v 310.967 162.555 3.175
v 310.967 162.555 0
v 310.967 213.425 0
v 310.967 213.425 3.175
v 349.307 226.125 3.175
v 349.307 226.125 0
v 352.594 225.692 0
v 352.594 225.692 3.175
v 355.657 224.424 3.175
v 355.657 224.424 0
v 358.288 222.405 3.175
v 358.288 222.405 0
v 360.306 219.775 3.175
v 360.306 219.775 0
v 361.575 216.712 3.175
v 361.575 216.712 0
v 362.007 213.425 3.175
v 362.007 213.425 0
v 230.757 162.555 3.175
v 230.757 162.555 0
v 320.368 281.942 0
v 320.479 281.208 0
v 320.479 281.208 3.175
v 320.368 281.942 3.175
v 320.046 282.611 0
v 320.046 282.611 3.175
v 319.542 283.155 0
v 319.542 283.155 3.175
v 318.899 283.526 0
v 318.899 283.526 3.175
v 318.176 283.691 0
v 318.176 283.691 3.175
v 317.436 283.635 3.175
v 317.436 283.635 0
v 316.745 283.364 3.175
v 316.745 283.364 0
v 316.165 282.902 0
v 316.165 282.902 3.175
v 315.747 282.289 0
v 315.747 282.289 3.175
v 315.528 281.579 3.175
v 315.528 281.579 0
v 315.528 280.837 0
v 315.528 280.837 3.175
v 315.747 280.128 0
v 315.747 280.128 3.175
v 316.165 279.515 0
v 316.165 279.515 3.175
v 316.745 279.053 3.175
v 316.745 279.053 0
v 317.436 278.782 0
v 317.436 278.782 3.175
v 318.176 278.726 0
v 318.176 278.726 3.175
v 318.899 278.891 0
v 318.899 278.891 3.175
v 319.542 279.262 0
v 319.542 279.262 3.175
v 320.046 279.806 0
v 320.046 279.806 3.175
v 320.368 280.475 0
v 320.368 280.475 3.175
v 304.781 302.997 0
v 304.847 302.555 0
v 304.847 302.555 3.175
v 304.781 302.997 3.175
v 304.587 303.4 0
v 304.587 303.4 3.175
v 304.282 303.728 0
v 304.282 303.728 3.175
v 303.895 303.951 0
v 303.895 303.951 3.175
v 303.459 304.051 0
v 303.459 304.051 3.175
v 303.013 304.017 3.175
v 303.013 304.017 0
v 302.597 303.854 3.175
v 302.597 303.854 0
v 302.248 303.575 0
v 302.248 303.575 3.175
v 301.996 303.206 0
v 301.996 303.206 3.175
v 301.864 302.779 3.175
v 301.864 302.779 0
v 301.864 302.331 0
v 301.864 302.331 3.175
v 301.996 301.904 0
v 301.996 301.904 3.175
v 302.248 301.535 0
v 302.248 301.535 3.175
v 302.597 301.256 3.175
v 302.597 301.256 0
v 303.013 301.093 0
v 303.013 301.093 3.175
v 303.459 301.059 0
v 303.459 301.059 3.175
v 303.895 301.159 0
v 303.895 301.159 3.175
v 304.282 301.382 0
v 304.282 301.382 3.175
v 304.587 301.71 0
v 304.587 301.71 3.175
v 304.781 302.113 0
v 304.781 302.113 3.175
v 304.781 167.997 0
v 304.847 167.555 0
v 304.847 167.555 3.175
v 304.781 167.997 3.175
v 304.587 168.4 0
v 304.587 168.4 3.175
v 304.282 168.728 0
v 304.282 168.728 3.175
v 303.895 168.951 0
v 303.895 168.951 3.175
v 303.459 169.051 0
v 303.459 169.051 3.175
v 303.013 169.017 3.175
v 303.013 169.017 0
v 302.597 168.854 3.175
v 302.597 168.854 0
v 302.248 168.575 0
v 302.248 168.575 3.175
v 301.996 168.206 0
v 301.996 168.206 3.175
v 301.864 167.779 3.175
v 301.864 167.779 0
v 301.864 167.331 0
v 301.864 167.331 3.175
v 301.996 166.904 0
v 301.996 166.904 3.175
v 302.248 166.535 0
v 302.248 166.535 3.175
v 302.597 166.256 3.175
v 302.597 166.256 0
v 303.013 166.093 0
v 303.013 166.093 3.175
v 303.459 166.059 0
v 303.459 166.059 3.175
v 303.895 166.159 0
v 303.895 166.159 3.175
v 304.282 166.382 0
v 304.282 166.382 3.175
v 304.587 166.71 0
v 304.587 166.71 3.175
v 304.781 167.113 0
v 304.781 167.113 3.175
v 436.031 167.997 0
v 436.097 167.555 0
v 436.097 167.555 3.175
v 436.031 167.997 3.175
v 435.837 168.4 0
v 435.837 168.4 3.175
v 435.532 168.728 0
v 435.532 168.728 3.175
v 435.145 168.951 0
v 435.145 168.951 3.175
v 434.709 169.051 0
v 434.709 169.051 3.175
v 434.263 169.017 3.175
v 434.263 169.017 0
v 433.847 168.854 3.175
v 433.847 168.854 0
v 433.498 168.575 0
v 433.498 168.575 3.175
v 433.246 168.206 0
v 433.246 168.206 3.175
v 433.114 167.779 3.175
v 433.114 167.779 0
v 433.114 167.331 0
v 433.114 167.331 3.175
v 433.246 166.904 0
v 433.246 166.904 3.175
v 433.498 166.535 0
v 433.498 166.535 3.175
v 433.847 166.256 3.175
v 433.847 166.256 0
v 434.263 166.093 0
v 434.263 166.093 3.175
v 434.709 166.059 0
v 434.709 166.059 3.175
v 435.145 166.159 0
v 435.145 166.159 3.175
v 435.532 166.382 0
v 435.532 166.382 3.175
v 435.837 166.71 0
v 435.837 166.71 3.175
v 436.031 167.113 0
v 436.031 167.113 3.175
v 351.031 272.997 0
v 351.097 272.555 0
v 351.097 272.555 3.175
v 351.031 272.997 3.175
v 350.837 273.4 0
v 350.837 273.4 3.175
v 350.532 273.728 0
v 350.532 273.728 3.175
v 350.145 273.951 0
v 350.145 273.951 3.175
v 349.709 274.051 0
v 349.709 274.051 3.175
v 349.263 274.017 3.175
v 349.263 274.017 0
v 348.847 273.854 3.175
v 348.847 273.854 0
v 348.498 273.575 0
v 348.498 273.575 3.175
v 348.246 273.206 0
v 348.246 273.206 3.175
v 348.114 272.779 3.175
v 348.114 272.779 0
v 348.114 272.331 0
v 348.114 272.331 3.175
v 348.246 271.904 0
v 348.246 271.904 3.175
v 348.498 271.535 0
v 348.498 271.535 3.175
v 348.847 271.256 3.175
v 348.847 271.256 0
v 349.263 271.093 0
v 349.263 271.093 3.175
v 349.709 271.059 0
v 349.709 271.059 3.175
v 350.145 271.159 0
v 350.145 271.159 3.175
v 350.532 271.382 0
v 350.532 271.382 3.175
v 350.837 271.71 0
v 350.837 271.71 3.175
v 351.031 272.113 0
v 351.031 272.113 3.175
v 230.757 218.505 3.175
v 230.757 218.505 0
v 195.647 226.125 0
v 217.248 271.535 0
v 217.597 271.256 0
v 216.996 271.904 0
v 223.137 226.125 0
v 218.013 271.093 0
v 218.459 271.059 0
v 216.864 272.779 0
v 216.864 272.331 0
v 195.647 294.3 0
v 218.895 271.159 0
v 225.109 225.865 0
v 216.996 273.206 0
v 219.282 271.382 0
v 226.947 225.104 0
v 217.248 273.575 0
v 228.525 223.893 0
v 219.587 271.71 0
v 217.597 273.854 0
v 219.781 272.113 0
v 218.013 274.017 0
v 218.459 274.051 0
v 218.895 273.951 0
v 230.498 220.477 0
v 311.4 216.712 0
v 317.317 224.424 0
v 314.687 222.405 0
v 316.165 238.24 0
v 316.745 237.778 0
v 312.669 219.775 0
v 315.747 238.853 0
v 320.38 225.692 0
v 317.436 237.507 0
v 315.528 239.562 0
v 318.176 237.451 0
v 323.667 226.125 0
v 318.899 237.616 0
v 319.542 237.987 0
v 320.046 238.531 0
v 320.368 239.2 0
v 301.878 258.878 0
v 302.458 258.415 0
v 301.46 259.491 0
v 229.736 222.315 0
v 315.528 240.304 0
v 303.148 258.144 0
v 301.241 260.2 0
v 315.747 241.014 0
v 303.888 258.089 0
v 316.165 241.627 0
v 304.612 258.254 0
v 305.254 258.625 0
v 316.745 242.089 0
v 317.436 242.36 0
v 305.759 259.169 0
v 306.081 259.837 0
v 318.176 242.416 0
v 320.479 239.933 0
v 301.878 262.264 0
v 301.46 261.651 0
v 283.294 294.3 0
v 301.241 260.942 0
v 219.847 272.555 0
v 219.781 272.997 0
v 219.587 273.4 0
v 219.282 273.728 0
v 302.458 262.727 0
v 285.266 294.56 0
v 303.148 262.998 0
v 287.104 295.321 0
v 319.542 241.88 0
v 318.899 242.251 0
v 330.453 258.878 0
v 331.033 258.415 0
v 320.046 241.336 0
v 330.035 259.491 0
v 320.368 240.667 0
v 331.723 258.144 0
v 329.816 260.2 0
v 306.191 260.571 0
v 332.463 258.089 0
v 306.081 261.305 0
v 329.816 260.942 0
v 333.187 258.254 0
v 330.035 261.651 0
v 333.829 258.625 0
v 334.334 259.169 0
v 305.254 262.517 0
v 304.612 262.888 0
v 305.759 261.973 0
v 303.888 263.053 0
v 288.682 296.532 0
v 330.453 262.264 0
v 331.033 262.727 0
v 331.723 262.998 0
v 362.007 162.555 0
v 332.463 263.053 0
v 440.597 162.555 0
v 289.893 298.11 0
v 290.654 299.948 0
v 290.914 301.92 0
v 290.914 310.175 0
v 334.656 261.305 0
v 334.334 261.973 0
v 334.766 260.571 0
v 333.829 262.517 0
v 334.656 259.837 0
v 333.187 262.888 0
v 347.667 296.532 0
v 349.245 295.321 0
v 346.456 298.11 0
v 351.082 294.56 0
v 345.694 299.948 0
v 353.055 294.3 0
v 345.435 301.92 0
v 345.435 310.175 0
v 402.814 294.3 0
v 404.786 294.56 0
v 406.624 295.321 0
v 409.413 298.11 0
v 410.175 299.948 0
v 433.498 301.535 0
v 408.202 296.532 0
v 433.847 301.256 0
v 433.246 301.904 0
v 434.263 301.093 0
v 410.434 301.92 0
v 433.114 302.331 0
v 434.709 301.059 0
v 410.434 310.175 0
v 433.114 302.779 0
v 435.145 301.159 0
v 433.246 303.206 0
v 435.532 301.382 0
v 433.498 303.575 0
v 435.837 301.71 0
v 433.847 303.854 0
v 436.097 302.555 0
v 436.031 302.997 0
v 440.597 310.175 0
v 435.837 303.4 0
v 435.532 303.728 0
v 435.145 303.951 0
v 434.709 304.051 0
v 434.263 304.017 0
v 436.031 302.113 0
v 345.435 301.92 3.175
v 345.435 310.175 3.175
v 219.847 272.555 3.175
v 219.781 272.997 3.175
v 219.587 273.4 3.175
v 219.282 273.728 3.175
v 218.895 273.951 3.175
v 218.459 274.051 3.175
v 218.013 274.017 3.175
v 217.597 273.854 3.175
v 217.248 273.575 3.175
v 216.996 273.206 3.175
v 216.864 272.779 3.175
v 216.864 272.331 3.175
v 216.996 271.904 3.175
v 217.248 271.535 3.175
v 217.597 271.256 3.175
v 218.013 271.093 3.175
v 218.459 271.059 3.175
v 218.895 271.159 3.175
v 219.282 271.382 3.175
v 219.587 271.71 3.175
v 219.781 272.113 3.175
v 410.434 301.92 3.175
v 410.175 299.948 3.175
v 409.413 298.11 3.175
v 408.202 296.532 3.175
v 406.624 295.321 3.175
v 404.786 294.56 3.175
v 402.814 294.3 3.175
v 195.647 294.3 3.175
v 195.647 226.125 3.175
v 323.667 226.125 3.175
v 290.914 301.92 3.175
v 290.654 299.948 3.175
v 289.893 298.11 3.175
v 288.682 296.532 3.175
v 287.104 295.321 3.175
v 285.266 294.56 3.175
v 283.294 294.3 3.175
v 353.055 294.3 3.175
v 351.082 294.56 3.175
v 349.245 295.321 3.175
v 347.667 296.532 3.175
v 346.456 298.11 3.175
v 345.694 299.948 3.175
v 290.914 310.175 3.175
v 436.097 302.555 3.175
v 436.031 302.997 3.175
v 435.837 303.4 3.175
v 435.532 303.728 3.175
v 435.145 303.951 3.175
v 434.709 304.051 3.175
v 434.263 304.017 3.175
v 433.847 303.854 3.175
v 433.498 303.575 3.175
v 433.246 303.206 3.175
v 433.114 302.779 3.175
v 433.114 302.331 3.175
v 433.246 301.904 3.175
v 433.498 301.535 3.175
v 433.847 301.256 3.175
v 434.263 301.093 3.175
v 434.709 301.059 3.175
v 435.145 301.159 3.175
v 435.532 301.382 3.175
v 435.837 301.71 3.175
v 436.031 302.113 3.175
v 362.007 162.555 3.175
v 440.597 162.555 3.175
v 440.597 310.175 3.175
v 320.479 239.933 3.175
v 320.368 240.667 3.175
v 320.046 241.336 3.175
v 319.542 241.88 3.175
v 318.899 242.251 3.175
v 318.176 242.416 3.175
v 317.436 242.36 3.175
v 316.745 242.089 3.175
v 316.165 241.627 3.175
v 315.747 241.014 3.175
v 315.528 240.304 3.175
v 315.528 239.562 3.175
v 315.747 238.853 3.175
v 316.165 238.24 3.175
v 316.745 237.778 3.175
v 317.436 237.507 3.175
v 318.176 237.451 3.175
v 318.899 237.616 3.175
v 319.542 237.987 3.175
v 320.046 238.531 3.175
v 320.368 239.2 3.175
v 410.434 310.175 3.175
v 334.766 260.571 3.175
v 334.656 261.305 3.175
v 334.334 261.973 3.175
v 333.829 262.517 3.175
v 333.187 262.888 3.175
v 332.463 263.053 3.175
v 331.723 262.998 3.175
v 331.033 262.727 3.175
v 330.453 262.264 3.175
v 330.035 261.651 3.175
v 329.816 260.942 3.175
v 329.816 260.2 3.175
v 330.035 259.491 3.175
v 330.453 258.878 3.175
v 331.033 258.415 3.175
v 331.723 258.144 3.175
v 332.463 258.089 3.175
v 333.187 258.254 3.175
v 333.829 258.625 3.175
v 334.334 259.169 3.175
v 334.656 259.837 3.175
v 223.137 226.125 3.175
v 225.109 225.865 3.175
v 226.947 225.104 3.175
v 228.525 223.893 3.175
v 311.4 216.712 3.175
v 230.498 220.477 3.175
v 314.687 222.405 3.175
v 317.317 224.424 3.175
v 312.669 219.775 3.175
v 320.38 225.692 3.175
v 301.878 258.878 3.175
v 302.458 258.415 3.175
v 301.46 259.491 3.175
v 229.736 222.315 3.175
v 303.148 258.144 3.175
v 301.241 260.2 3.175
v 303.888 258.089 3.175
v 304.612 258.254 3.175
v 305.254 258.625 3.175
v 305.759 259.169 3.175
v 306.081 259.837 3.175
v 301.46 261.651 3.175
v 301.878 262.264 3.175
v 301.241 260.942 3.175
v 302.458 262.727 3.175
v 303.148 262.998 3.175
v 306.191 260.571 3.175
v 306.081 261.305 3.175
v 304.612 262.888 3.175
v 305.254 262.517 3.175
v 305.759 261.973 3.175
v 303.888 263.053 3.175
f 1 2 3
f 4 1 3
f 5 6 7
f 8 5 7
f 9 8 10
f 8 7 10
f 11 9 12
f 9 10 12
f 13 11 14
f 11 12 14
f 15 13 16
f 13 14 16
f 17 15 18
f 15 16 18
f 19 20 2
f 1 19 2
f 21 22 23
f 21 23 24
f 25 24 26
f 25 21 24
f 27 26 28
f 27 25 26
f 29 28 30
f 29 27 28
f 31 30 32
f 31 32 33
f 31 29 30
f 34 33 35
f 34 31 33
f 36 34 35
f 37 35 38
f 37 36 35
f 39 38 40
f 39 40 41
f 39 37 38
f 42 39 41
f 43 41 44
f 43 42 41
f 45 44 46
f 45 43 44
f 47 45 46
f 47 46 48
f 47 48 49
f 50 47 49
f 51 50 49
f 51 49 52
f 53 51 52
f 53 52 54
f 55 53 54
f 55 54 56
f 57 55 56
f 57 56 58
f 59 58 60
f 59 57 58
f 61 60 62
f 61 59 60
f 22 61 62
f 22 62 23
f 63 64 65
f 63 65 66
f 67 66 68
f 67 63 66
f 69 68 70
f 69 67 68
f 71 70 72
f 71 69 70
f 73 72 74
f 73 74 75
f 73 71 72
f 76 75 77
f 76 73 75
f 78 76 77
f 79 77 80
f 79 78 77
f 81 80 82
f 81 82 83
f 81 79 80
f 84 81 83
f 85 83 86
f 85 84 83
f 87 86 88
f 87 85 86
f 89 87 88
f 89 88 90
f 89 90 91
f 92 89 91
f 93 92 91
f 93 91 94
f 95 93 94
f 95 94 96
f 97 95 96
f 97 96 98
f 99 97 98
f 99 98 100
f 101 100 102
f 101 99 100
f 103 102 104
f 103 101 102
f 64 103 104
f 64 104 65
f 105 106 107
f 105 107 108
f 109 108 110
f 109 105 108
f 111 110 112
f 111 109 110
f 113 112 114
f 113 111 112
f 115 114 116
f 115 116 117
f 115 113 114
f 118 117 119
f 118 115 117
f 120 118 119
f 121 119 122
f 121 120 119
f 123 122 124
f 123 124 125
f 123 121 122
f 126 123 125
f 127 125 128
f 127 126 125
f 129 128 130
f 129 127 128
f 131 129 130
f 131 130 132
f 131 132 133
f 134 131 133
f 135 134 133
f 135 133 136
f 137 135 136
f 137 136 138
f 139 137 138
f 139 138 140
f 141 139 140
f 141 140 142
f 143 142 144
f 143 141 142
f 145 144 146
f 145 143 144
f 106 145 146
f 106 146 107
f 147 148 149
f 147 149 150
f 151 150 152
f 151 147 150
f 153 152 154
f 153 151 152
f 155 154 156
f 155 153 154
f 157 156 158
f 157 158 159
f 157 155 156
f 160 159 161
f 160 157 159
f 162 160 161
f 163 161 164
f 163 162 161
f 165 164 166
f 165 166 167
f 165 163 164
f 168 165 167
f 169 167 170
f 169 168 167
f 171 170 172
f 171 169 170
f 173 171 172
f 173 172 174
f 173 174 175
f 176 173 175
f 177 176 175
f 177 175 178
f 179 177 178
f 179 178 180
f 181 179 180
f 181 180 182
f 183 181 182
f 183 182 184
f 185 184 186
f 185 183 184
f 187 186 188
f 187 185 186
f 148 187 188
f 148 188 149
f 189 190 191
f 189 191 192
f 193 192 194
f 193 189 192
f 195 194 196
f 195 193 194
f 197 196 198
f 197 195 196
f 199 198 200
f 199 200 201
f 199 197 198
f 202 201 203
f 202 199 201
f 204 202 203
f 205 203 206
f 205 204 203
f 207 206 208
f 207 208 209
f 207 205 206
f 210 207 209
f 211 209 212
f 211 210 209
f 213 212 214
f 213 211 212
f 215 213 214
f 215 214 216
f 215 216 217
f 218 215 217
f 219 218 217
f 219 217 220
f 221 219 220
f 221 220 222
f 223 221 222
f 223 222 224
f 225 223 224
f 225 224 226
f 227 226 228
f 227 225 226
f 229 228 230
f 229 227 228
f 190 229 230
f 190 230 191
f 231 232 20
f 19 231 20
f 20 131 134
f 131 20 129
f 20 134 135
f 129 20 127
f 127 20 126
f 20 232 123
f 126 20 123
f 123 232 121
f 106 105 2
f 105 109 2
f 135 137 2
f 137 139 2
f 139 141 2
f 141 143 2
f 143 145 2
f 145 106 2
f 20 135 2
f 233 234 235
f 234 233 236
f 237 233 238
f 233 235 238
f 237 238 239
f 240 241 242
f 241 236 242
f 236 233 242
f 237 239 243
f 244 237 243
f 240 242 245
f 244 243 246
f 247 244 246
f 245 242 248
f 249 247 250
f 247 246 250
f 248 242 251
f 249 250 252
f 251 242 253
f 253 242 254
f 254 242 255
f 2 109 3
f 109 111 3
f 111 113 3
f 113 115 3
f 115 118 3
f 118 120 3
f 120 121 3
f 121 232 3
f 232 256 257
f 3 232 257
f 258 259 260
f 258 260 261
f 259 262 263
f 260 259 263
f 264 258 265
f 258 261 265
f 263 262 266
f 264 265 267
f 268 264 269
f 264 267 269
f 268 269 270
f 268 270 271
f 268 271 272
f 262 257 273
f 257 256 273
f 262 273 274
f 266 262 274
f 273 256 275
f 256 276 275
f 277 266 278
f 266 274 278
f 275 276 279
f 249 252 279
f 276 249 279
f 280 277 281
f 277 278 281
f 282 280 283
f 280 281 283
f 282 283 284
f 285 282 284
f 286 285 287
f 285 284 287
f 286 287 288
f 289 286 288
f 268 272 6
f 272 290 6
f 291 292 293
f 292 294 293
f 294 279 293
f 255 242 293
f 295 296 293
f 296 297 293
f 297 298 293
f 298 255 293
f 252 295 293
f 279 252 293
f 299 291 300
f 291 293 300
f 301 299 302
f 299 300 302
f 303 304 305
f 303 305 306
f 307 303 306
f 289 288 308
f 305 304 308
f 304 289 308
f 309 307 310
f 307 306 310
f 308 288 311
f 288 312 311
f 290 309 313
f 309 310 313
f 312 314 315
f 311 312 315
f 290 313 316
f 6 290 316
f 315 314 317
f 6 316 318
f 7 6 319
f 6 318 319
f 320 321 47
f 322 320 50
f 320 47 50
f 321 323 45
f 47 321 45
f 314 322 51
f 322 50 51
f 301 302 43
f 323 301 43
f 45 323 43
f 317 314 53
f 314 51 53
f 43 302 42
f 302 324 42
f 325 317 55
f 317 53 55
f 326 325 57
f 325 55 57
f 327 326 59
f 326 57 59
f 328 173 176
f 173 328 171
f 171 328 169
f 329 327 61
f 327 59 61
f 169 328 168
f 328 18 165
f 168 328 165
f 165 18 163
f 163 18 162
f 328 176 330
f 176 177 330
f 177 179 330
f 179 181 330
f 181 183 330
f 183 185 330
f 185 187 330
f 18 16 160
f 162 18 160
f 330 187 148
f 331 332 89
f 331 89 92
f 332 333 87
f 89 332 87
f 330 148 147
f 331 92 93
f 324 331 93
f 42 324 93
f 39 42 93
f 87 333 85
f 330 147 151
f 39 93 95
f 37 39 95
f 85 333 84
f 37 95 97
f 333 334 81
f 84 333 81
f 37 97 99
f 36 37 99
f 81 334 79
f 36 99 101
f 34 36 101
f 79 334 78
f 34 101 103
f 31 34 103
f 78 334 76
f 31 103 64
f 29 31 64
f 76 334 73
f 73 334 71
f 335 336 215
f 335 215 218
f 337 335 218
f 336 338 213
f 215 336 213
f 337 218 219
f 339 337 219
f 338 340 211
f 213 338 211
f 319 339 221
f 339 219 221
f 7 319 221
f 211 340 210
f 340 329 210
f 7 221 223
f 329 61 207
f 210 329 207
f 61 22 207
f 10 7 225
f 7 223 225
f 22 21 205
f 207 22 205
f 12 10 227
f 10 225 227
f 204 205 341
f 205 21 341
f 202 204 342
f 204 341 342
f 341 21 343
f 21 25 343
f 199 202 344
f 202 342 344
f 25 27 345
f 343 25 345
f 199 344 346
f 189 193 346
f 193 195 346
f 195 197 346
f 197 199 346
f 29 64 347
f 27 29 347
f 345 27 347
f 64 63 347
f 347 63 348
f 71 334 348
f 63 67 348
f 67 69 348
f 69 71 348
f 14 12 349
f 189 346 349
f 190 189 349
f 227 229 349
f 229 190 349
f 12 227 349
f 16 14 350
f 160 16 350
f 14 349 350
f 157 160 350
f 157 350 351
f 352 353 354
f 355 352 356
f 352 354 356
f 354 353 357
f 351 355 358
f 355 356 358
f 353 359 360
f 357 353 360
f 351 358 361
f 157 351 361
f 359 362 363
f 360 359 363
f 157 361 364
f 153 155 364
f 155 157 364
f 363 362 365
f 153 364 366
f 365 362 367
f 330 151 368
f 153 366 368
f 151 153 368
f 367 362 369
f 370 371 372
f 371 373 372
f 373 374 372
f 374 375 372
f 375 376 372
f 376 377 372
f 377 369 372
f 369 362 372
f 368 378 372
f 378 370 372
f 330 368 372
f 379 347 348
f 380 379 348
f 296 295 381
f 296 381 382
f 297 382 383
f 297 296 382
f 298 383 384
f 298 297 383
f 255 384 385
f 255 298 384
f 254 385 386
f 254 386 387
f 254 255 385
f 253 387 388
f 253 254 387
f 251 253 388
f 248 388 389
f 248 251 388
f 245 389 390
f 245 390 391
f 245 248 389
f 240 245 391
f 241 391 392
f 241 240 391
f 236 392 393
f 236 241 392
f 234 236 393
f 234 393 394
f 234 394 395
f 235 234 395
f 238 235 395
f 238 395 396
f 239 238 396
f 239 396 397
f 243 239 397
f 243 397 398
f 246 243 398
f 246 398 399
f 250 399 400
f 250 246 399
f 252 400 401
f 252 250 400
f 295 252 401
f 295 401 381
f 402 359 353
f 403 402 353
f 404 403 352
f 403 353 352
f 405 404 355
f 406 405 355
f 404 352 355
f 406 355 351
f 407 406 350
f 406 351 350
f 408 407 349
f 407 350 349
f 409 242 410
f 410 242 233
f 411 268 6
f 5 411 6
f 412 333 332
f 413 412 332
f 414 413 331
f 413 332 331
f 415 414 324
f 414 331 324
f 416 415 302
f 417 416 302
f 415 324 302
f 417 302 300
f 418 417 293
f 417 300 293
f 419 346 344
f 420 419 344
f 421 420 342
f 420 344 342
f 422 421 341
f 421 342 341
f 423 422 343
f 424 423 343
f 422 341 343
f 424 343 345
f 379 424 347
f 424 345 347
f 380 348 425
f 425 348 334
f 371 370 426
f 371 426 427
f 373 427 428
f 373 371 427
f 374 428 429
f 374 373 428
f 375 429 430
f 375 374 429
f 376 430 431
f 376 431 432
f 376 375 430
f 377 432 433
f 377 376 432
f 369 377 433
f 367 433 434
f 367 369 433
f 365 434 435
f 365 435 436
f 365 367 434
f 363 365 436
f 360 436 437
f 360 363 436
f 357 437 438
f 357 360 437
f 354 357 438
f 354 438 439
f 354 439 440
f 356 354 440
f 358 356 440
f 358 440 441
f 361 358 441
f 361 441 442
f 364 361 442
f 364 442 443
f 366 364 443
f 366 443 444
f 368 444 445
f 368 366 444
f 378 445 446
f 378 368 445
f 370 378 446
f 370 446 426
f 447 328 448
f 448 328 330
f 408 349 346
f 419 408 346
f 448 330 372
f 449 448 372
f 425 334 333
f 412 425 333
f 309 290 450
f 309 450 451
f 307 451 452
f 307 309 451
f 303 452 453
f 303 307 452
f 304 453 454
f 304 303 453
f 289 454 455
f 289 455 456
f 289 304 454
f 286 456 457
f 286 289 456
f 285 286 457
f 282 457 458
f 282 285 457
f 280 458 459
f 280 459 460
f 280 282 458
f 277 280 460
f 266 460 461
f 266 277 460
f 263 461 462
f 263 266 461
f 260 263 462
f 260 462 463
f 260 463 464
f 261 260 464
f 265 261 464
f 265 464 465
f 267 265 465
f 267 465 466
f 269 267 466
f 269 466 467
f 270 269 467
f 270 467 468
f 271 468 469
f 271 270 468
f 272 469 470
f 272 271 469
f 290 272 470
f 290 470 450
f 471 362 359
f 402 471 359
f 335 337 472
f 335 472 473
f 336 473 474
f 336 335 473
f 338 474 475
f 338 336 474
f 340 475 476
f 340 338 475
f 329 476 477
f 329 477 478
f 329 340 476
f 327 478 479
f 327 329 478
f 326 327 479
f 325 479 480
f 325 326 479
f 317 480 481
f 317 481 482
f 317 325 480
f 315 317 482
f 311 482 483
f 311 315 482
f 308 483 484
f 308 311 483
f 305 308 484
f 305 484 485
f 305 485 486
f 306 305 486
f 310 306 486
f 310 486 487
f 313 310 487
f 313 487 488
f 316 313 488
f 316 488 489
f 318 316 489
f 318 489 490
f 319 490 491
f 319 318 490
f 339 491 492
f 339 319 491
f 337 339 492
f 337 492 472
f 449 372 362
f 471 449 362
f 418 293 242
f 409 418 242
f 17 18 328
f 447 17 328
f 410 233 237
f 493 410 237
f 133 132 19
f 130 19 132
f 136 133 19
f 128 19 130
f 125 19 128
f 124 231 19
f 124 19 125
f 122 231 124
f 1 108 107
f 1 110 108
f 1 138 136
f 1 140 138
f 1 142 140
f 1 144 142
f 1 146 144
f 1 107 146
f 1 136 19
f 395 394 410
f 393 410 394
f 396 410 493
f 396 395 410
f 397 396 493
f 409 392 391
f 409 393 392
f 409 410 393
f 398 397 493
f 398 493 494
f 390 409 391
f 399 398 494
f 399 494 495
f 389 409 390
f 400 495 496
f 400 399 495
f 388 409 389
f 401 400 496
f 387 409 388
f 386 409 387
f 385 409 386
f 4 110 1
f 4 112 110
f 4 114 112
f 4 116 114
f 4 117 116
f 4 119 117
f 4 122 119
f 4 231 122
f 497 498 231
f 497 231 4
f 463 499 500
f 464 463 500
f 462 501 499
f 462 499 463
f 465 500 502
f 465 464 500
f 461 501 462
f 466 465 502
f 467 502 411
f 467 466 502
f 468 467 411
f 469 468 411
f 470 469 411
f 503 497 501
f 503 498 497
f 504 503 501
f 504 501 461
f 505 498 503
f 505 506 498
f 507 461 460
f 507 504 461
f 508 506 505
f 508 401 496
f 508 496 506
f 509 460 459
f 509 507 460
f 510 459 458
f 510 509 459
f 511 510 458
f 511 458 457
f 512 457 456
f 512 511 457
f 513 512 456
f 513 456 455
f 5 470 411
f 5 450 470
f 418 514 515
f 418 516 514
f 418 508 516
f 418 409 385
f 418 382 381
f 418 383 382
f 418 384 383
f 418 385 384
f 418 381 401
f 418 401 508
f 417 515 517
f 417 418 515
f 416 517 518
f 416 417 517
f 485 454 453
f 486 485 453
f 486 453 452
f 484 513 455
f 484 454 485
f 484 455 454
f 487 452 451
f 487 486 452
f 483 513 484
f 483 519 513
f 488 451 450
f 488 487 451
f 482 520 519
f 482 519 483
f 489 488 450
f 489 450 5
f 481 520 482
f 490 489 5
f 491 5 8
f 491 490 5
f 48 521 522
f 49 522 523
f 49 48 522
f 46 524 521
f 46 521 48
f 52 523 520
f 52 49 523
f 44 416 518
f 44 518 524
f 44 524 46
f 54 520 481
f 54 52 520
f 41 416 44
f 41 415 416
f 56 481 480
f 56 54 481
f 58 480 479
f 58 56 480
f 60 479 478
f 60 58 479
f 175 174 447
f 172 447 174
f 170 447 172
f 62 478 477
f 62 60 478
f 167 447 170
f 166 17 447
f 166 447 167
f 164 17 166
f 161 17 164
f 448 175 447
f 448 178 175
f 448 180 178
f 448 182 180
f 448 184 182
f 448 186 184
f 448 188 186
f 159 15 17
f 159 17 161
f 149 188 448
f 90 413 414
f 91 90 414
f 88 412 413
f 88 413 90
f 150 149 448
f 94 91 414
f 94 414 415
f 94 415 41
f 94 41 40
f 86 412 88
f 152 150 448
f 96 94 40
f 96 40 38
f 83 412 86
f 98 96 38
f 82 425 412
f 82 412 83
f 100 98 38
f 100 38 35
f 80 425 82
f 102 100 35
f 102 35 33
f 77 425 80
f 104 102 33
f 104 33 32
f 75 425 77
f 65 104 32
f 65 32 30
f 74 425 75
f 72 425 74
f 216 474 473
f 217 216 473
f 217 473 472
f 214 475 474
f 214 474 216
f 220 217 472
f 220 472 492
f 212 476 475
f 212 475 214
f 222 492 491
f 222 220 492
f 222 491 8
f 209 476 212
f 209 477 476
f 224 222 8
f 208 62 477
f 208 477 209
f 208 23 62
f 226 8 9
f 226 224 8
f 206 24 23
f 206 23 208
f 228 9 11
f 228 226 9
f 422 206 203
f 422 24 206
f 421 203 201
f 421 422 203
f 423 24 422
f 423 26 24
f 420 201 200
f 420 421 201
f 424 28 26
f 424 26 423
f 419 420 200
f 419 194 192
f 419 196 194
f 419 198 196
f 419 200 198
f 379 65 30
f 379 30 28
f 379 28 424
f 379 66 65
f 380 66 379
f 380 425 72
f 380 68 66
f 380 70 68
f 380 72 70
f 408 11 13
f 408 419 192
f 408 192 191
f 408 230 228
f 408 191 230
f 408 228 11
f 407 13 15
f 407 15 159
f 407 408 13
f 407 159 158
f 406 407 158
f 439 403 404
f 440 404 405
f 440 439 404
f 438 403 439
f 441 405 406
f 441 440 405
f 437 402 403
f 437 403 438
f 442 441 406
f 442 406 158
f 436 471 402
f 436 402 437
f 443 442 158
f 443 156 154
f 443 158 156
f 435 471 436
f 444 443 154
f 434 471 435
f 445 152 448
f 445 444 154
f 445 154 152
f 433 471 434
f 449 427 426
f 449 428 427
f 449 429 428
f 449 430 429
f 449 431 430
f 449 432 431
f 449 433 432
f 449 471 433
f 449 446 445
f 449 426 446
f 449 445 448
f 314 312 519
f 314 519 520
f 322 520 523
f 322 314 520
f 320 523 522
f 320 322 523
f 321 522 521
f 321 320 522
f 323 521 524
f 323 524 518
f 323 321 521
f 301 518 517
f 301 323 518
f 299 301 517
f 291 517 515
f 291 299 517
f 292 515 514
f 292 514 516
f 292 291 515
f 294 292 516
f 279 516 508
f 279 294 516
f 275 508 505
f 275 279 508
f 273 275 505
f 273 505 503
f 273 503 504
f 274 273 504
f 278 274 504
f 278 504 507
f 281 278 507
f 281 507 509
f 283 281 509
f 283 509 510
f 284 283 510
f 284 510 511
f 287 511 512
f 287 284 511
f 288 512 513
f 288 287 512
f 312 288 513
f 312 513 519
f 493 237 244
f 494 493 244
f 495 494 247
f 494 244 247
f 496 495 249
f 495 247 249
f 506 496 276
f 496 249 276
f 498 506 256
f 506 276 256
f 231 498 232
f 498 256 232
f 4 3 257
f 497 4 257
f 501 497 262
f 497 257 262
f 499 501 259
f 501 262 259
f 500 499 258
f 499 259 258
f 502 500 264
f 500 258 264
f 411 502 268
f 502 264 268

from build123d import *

# Parameters (mm, degrees)
MODEL_R             = 1.5
MODEL_R_2           = 2.4892
BOSS_EXTRUDE1_DEPTH = 3.175


with BuildPart() as part:
    # Model → Boss-Extrude1 (new body)
    with BuildSketch(Plane.XY):
        with BuildLine():
            Line((323.667245607, 226.12499065), (349.307245607, 226.12499065))
            ThreePointArc((349.307245607, 226.12499065), (358.287501728, 222.405246771), (362.007245607, 213.42499065))
            Line((362.007245607, 213.42499065), (362.007245607, 162.55499065))
            Line((362.007245607, 162.55499065), (440.597245607, 162.55499065))
            Line((440.597245607, 162.55499065), (440.597245607, 310.17499065))
            Line((440.597245607, 310.17499065), (410.434211887, 310.17499065))
            Line((410.434211887, 310.17499065), (410.434211887, 301.91999065))
            ThreePointArc((410.434211887, 301.91999065), (408.20236556, 296.531836978), (402.814211887, 294.29999065))
            Line((402.814211887, 294.29999065), (353.054686067, 294.29999065))
            ThreePointArc((353.054686067, 294.29999065), (347.666532395, 296.531836978), (345.434686067, 301.91999065))
            Line((345.434686067, 301.91999065), (345.434686067, 310.17499065))
            Line((345.434686067, 310.17499065), (290.913803272, 310.17499065))
            Line((290.913803272, 310.17499065), (290.913803272, 301.91999065))
            ThreePointArc((290.913803272, 301.91999065), (288.681956945, 296.531836978), (283.293803272, 294.29999065))
            Line((283.293803272, 294.29999065), (195.647245607, 294.29999065))
            Line((195.647245607, 294.29999065), (195.647245607, 226.12499065))
            Line((195.647245607, 226.12499065), (223.137245607, 226.12499065))
            ThreePointArc((223.137245607, 226.12499065), (228.525399279, 223.893144323), (230.757245607, 218.50499065))
            Line((230.757245607, 218.50499065), (230.757245607, 162.55499065))
            Line((230.757245607, 162.55499065), (310.967245607, 162.55499065))
            Line((310.967245607, 162.55499065), (310.967245607, 213.42499065))
            ThreePointArc((310.967245607, 213.42499065), (314.686989486, 222.405246771), (323.667245607, 226.12499065))
        make_face()
        with Locations((303.347245607, 167.55499065)):
            Circle(MODEL_R, mode=Mode.SUBTRACT)
        with Locations((434.597245607, 167.55499065)):
            Circle(MODEL_R, mode=Mode.SUBTRACT)
        with Locations((218.347245607, 272.55499065)):
            Circle(MODEL_R, mode=Mode.SUBTRACT)
        with Locations((317.989745607, 239.93349065)):
            Circle(MODEL_R_2, mode=Mode.SUBTRACT)
        with Locations((303.702245607, 260.57099065)):
            Circle(MODEL_R_2, mode=Mode.SUBTRACT)
        with Locations((317.989745607, 281.20849065)):
            Circle(MODEL_R_2, mode=Mode.SUBTRACT)
        with Locations((303.347245607, 302.55499065)):
            Circle(MODEL_R, mode=Mode.SUBTRACT)
        with Locations((332.277245607, 260.57099065)):
            Circle(MODEL_R_2, mode=Mode.SUBTRACT)
        with Locations((349.597245607, 272.55499065)):
            Circle(MODEL_R, mode=Mode.SUBTRACT)
        with Locations((434.597245607, 302.55499065)):
            Circle(MODEL_R, mode=Mode.SUBTRACT)
    extrude(amount=BOSS_EXTRUDE1_DEPTH)


solid = part.part
